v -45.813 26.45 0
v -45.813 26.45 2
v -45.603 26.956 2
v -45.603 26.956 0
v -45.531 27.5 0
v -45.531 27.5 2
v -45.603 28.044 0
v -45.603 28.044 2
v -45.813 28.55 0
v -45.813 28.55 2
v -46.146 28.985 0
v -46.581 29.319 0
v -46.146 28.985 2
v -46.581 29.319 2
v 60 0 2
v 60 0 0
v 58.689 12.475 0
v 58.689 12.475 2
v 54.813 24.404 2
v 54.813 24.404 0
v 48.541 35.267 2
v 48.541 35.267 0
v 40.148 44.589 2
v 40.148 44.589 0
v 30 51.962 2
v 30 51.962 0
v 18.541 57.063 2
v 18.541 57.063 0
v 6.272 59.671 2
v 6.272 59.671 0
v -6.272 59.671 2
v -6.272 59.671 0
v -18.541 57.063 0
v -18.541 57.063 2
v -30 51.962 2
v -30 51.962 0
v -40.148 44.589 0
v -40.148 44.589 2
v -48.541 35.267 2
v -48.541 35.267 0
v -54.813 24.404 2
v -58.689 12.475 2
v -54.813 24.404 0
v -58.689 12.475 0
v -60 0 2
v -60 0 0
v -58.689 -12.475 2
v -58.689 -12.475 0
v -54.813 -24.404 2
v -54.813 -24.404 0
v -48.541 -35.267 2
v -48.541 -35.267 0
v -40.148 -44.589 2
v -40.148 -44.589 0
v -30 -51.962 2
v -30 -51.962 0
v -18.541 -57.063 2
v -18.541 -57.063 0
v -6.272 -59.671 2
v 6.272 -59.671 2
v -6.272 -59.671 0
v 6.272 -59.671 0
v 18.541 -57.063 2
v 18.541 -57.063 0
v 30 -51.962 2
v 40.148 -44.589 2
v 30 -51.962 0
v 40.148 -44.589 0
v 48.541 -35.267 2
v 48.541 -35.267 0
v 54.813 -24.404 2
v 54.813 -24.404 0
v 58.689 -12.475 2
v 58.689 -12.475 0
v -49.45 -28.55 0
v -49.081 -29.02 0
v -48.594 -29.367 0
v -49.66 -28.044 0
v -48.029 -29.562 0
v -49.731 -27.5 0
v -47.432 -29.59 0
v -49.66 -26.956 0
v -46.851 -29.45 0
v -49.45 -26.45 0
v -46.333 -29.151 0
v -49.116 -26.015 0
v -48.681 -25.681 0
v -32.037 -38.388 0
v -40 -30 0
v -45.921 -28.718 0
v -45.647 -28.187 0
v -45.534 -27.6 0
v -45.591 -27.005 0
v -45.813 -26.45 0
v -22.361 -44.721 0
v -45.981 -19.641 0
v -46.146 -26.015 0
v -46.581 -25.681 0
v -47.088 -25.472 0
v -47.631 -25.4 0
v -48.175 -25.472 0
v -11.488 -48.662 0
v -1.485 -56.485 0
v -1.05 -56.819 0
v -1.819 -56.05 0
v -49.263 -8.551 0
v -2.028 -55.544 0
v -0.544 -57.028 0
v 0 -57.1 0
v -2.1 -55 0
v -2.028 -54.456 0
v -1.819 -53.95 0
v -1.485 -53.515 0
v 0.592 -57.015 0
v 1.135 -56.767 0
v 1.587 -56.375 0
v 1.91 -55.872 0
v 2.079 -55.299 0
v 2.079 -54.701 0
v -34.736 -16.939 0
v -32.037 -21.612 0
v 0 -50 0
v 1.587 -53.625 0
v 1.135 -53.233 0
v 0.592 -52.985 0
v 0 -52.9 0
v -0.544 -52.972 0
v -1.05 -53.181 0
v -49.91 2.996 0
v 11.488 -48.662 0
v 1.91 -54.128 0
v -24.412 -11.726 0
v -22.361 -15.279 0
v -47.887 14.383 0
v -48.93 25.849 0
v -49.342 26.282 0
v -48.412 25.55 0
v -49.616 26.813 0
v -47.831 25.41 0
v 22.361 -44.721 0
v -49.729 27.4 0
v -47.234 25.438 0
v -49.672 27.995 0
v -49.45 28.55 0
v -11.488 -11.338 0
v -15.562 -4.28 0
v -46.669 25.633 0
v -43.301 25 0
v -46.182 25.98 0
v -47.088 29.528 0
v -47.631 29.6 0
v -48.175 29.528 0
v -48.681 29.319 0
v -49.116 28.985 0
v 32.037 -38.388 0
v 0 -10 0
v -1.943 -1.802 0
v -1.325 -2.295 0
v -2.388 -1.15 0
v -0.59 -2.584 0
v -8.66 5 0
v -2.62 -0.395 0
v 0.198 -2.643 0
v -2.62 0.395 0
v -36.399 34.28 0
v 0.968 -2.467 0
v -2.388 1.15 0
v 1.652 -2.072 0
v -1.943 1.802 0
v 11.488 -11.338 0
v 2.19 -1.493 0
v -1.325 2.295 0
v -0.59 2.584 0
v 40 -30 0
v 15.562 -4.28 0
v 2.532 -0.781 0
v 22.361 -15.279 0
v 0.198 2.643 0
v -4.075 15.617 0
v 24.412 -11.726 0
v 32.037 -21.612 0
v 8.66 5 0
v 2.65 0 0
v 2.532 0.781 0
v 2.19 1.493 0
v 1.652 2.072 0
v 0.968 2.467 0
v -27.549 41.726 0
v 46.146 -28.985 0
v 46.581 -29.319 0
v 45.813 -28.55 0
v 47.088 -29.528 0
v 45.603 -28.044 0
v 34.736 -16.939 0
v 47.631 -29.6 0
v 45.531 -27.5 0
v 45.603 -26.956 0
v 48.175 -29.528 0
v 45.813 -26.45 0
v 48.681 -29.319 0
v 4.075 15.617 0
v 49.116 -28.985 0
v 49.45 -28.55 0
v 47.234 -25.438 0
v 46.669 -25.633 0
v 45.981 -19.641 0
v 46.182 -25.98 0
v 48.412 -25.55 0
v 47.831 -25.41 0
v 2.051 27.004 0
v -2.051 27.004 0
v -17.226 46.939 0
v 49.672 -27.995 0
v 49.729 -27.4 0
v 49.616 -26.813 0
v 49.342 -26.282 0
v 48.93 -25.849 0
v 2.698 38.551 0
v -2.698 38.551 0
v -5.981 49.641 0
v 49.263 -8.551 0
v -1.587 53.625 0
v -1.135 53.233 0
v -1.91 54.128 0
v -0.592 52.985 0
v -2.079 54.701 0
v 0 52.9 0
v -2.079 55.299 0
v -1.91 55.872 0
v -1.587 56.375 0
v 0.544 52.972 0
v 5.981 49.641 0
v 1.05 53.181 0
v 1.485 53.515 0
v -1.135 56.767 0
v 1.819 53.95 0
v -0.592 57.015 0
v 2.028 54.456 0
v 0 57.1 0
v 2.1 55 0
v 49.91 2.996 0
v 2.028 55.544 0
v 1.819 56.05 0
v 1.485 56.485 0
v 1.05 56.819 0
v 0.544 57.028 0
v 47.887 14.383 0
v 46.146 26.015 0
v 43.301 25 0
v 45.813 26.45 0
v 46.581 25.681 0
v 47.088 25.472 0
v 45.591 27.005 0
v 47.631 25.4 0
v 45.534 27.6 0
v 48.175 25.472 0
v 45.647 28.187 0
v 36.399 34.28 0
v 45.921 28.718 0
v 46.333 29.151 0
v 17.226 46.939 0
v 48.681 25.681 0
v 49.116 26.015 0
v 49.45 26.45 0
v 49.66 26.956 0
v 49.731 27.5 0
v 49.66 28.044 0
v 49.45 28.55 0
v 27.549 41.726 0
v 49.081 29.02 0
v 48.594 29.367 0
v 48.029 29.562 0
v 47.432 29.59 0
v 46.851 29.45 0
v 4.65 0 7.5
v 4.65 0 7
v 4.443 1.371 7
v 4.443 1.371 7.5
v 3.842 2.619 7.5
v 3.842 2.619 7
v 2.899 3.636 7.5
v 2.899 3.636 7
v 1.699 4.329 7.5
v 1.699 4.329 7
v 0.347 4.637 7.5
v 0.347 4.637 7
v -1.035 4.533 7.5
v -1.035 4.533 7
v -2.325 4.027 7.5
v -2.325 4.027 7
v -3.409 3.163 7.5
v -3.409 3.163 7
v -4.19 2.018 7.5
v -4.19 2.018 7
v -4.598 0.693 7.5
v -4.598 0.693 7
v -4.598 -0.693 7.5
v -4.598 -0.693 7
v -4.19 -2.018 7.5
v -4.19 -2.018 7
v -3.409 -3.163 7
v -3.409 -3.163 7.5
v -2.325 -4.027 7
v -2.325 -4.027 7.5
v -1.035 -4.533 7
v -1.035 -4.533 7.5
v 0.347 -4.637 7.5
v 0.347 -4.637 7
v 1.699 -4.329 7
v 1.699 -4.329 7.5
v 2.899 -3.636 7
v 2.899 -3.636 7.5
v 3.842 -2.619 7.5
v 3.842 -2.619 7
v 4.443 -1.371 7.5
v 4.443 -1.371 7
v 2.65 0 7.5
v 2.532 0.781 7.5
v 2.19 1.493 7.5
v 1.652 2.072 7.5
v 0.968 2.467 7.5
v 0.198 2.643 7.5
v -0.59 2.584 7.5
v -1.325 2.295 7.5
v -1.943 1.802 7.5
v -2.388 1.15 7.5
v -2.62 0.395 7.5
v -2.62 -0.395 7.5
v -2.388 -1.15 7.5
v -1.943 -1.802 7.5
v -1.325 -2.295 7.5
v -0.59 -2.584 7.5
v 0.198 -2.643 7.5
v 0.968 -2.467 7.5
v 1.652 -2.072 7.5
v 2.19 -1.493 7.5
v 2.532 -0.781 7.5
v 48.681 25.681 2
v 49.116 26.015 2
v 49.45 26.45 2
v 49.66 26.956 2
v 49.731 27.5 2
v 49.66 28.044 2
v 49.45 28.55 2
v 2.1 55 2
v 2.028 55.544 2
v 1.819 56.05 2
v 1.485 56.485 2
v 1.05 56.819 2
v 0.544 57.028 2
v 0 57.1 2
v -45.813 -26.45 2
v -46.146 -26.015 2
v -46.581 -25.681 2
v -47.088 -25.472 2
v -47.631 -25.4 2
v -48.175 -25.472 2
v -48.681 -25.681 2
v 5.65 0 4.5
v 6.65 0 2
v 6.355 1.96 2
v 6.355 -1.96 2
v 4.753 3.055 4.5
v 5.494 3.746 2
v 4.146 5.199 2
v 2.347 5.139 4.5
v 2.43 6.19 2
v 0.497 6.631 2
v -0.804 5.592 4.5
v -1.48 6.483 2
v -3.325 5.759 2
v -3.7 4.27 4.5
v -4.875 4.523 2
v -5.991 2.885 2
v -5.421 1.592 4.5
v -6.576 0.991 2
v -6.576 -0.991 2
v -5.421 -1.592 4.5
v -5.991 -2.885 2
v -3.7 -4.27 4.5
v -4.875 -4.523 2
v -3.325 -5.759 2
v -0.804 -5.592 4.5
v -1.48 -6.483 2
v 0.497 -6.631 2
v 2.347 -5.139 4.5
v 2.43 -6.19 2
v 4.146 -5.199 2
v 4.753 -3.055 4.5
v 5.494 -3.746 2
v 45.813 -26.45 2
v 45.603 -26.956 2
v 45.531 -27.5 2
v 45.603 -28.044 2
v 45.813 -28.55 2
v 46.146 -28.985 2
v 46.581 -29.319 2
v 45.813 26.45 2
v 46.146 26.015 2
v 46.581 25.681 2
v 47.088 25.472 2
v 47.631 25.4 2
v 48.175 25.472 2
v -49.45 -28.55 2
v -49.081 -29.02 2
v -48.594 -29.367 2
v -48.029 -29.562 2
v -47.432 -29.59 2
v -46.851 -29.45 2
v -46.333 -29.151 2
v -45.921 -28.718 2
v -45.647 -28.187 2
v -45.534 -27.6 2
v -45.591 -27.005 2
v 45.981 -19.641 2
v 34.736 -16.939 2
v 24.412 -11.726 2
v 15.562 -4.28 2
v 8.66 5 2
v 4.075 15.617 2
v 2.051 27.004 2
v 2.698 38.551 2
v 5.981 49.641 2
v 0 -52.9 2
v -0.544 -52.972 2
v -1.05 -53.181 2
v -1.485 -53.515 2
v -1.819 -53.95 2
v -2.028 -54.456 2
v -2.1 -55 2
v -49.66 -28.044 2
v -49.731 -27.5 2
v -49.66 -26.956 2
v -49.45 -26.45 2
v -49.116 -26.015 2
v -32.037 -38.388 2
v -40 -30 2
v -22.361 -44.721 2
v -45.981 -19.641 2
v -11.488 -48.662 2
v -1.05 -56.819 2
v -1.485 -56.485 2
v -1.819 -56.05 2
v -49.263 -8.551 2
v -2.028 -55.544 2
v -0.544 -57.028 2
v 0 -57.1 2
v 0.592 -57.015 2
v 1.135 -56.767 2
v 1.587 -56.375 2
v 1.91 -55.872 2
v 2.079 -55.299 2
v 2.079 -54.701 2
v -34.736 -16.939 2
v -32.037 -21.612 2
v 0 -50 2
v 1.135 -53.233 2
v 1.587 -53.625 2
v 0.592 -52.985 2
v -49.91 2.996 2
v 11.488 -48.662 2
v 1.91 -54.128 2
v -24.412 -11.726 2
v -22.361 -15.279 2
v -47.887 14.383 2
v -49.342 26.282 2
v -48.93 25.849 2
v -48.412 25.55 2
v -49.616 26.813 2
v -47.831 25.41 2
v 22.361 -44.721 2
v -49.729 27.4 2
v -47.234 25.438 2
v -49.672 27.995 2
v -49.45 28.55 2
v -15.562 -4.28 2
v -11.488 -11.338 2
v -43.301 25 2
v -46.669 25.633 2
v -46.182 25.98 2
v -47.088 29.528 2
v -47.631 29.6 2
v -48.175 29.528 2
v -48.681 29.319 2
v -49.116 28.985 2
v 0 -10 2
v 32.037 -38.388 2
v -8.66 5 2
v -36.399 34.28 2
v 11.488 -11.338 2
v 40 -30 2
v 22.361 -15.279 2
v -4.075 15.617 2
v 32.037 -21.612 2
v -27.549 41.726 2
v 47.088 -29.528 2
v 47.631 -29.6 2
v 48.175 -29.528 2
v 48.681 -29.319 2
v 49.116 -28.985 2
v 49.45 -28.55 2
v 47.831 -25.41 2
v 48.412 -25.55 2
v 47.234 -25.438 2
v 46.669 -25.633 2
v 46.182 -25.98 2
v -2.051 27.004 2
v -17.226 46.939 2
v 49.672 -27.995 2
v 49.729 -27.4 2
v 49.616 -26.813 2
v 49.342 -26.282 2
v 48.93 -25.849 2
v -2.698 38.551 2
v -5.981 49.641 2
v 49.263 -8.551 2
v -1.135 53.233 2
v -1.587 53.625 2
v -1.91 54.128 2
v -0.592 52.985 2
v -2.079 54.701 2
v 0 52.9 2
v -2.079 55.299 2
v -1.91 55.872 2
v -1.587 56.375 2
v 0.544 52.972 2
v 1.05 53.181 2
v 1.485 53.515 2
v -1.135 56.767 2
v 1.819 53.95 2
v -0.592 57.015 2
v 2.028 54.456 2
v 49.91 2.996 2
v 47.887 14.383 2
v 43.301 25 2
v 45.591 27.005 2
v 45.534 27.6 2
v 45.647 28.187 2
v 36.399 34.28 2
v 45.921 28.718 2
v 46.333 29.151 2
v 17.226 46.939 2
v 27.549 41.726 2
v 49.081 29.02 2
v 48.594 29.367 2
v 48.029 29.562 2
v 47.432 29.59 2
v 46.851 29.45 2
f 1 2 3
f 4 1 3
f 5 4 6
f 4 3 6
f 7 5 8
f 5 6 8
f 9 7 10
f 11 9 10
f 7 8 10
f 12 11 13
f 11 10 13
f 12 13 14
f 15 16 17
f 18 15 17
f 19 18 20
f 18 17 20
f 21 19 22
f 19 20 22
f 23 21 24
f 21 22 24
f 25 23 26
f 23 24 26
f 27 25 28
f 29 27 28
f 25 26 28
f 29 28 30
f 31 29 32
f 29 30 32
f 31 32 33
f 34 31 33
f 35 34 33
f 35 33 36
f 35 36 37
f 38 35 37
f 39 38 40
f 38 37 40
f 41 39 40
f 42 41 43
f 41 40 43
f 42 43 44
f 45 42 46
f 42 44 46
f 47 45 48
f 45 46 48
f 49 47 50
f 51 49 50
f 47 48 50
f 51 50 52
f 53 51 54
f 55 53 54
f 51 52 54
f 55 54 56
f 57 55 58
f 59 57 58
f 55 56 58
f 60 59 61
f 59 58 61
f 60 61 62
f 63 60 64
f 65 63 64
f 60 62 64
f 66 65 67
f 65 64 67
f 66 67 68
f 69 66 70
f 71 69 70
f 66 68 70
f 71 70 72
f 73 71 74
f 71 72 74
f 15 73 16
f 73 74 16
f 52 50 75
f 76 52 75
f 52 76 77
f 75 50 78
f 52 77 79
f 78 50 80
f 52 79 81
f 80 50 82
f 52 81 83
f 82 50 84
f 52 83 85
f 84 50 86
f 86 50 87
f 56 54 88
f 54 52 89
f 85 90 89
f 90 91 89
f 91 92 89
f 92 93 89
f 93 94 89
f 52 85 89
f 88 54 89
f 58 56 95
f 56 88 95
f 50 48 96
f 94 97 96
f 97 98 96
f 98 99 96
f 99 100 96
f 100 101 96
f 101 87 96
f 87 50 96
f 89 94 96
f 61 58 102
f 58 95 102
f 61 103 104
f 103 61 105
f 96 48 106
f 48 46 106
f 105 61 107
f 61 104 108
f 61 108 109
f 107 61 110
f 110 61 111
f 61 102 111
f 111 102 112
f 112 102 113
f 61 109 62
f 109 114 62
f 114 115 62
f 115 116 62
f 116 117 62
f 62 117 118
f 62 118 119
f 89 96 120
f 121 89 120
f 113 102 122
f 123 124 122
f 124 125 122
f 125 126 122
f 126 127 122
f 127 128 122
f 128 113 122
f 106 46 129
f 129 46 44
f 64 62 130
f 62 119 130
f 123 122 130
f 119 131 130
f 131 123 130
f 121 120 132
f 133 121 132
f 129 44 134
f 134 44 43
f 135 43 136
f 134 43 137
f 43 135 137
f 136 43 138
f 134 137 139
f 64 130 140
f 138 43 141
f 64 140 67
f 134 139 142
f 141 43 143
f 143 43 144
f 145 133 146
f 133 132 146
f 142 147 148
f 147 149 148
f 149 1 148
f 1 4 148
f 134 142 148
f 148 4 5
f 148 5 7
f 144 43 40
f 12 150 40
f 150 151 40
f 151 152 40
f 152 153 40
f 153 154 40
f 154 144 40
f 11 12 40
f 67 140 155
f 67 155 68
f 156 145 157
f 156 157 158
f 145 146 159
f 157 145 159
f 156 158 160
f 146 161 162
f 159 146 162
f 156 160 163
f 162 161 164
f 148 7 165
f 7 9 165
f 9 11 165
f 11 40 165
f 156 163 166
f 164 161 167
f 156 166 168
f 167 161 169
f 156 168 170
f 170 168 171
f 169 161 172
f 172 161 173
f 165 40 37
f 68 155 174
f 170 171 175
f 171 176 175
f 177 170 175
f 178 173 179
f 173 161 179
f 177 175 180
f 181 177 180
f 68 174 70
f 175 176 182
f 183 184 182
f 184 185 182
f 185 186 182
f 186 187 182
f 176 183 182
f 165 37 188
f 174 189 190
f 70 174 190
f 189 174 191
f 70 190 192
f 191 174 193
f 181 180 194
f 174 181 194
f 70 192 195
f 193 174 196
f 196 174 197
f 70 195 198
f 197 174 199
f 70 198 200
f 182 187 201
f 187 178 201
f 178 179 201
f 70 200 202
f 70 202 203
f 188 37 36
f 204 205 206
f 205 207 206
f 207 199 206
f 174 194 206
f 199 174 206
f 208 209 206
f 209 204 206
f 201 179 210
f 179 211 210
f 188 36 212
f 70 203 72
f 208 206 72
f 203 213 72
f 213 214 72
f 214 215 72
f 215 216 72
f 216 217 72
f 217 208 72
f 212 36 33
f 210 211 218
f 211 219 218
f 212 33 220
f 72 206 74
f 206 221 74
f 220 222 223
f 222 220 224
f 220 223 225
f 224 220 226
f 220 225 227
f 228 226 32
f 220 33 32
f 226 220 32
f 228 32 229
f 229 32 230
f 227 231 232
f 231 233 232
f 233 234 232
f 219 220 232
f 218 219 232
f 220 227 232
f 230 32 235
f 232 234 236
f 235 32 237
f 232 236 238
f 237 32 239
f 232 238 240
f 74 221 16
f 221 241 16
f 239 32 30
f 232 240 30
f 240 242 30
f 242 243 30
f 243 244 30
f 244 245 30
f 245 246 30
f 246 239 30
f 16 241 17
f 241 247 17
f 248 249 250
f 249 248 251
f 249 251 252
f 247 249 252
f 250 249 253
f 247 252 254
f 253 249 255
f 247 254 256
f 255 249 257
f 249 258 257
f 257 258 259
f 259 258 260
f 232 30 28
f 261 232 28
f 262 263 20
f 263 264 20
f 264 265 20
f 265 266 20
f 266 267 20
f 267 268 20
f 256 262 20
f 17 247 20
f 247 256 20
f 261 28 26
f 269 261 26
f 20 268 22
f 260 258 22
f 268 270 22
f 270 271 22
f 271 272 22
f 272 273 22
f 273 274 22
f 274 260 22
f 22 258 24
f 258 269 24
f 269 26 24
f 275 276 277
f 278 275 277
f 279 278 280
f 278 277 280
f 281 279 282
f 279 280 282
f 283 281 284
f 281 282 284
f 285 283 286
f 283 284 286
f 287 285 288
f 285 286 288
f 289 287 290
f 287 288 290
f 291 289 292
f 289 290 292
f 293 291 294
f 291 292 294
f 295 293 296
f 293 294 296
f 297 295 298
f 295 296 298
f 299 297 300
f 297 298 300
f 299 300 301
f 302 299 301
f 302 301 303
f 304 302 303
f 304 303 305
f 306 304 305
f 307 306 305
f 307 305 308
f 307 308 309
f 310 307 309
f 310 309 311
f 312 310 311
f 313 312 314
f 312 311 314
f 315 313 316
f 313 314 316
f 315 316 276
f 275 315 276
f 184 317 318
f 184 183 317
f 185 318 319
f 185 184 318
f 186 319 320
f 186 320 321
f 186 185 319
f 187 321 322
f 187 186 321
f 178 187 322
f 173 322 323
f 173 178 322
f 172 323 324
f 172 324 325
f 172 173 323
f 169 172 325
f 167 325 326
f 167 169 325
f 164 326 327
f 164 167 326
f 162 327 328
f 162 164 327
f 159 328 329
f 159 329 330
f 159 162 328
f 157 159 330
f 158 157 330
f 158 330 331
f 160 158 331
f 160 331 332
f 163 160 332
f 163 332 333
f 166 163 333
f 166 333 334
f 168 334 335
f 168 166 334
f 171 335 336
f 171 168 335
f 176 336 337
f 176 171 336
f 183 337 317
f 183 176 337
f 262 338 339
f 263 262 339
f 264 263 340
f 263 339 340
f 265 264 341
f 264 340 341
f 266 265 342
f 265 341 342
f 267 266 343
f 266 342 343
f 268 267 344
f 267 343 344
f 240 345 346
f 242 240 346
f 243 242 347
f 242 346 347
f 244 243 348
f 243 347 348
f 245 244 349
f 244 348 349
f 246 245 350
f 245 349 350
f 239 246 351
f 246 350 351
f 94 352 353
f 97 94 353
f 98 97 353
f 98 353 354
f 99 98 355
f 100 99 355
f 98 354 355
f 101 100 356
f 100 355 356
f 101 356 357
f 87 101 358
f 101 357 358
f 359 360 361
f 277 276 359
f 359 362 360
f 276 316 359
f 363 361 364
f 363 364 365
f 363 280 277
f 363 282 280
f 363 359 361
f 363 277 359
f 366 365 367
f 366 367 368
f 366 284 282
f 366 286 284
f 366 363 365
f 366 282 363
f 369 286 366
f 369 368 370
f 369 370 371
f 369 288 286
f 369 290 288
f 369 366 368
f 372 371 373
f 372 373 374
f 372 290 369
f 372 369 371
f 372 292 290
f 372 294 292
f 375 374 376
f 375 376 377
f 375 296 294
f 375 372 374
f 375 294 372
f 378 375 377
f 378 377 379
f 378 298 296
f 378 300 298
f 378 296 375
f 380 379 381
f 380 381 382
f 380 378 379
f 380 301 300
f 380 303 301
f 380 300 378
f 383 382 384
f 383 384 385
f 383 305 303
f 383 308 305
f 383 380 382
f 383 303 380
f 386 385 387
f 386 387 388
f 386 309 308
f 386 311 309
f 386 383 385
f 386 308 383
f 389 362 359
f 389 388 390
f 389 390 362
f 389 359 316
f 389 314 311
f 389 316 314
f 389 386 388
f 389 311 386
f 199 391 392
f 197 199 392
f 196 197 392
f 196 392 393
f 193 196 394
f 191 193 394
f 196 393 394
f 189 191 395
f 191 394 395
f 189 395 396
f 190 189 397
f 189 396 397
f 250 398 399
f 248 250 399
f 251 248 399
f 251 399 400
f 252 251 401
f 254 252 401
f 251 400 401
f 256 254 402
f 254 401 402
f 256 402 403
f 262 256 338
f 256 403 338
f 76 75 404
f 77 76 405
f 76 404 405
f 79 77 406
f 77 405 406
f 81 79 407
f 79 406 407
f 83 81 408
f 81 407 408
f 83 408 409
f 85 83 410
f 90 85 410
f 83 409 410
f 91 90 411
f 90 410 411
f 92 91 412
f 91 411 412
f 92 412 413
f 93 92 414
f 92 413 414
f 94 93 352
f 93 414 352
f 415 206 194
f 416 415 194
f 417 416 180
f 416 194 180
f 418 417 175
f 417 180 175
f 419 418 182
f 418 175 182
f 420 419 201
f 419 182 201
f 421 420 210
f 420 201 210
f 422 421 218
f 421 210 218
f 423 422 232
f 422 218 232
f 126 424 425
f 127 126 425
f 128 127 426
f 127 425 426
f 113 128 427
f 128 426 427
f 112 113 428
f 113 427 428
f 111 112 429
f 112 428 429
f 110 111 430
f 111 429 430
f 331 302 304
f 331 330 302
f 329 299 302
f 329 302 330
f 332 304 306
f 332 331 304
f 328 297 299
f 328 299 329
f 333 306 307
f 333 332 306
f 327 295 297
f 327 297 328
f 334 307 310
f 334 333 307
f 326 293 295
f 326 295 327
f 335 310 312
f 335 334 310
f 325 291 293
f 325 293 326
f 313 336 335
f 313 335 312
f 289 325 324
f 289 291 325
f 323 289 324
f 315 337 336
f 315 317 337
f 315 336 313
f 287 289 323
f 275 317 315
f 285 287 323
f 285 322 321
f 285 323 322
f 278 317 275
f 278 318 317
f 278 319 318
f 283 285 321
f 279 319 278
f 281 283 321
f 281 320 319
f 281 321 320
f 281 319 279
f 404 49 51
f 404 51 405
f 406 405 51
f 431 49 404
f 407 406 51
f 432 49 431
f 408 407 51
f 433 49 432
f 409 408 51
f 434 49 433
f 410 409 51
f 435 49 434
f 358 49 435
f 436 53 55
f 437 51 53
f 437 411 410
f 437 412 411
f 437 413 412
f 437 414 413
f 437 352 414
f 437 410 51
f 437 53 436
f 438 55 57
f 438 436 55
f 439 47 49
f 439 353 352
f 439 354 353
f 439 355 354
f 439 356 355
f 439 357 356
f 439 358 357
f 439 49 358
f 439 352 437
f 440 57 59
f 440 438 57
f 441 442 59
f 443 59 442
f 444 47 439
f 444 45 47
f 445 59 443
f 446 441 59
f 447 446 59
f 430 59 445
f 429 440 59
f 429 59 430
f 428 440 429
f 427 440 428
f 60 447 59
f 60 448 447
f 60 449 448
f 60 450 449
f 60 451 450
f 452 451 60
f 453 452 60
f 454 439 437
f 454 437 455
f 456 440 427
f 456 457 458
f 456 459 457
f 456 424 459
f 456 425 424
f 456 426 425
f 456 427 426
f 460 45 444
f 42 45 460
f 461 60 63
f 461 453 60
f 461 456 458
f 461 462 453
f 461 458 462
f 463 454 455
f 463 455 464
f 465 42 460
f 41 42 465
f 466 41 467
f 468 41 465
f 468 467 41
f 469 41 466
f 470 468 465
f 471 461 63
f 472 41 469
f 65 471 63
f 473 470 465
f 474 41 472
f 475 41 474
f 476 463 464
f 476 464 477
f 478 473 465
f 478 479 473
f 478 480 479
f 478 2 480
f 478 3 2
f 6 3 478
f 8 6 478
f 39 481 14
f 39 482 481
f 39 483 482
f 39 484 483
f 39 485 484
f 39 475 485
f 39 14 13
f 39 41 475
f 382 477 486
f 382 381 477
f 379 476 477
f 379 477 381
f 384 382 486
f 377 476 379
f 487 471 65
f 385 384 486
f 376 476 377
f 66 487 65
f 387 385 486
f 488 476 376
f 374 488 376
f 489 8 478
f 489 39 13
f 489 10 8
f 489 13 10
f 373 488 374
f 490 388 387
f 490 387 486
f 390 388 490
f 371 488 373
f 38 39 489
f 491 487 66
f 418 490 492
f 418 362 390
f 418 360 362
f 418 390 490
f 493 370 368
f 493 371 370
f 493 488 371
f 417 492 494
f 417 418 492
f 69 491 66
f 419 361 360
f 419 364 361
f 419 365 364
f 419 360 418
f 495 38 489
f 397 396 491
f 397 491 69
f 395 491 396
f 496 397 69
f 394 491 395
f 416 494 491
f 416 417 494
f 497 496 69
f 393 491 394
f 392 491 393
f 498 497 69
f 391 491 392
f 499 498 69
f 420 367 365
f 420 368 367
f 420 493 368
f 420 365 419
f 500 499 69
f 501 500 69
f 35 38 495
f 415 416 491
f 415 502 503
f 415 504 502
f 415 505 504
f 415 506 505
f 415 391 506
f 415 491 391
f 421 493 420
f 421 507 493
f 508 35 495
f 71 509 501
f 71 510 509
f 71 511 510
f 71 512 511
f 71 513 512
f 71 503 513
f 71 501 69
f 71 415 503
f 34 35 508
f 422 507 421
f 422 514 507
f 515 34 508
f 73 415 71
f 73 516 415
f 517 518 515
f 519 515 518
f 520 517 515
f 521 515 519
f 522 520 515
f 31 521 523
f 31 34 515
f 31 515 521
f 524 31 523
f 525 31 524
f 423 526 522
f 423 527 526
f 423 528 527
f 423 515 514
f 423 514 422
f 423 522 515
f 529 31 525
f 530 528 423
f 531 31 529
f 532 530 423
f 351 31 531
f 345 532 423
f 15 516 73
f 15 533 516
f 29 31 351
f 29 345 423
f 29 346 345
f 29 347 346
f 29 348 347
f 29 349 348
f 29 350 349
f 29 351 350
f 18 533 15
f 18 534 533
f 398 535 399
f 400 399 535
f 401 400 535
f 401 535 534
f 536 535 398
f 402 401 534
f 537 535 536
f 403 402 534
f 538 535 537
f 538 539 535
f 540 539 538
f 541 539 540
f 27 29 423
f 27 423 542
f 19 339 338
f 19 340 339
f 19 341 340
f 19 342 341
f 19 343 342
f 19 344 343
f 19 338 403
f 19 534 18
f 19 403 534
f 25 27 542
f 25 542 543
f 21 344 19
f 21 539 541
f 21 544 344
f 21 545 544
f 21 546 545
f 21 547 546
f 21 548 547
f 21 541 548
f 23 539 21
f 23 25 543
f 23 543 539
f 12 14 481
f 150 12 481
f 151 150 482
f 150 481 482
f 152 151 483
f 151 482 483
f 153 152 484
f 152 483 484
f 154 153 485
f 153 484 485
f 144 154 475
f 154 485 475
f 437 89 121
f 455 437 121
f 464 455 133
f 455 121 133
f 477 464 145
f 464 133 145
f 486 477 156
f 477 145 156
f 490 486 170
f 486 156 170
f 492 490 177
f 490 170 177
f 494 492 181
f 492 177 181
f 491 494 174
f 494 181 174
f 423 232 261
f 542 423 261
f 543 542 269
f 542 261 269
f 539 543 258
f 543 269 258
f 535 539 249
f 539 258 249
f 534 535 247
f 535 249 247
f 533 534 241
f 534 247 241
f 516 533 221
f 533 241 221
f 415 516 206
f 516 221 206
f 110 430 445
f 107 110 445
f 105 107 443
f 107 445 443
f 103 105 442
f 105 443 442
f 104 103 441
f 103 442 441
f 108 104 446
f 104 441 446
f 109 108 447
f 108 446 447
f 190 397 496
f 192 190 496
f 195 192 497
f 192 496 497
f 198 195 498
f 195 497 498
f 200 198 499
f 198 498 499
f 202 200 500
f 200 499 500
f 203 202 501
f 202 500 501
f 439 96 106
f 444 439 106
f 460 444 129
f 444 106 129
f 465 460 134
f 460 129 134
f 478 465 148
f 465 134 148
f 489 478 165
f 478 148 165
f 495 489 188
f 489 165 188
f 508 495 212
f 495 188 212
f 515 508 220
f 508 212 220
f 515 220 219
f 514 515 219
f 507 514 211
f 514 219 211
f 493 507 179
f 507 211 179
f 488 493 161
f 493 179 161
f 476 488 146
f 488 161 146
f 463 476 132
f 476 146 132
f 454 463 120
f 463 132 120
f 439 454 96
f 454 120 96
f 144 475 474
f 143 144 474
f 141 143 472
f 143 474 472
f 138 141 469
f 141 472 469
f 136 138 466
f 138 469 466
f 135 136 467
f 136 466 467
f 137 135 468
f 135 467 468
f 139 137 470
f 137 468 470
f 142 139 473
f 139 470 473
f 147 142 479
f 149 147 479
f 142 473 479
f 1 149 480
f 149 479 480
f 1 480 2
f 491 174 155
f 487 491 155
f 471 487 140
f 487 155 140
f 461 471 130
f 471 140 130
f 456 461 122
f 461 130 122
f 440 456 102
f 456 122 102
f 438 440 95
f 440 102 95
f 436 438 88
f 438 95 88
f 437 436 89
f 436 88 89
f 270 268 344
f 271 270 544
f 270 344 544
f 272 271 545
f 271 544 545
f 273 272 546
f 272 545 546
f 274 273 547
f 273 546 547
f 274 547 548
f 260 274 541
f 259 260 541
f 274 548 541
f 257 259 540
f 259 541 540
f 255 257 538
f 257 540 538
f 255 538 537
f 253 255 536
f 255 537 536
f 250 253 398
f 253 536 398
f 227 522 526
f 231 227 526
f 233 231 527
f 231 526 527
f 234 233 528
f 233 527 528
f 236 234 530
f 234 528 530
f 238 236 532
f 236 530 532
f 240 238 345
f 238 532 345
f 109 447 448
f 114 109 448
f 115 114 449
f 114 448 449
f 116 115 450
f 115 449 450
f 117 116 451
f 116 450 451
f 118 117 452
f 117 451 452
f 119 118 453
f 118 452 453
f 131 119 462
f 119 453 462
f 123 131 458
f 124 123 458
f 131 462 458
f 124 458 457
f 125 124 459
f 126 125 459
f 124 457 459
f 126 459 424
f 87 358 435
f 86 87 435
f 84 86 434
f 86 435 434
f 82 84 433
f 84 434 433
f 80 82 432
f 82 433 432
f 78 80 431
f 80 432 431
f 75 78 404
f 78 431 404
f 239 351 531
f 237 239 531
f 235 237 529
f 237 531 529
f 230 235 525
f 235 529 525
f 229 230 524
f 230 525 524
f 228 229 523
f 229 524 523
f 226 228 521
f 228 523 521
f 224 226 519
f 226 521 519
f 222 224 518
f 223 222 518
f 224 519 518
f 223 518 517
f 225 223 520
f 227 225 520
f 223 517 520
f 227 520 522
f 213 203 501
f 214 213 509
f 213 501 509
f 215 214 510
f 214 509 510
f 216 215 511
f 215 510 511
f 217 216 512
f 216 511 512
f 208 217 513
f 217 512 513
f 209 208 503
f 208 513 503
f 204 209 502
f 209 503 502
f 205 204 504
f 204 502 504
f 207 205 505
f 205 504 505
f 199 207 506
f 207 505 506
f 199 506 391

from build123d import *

# Parameters (mm, degrees)
SKETCH1_R           = 60
SKETCH1_R_2         = 2.65
BOSS_EXTRUDE2_DEPTH = 2
CUT_EXTRUDE1_DEPTH  = 85.876380696
CIRPATTERN1_COUNT   = 6
SKETCH3_R           = 4.65
SKETCH3_R_2         = 2.65
BOSS_EXTRUDE3_DEPTH = 5.5
CHAMFER1_SIZE       = 2
CHAMFER1_SIZE2      = 5


with BuildPart() as part:
    # Sketch1 → Boss-Extrude2 (new body)
    with BuildSketch(Plane.XY):
        Circle(SKETCH1_R)
        with BuildLine():
            ThreePointArc((40, -30), (0, -50), (-40, -30))
            ThreePointArc((-40, -30), (0, -10), (40, -30))
        make_face(mode=Mode.SUBTRACT)
        with BuildLine():
            ThreePointArc((-5.980762114, 49.641016151), (-8.660254038, 5), (-45.980762114, -19.641016151))
            ThreePointArc((-45.980762114, -19.641016151), (-43.301270189, 25), (-5.980762114, 49.641016151))
        make_face(mode=Mode.SUBTRACT)
        Circle(SKETCH1_R_2, mode=Mode.SUBTRACT)
        with BuildLine():
            ThreePointArc((5.980762114, 49.641016151), (43.301270189, 25), (45.980762114, -19.641016151))
            ThreePointArc((45.980762114, -19.641016151), (8.660254038, 5), (5.980762114, 49.641016151))
        make_face(mode=Mode.SUBTRACT)
    extrude(amount=BOSS_EXTRUDE2_DEPTH)

    # Sketch2 → Cut-Extrude1 (cut, through all)
    with BuildSketch(Plane.XY.offset(2)):
        with BuildLine():
            ThreePointArc((0, 57.1), (-2.1, 55), (0, 52.9))
            Line((0, 52.9), (0, 57.1))
        make_face()
        with BuildLine():
            Line((0, 57.1), (0, 52.9))
            ThreePointArc((0, 52.9), (1.48492424, 53.51507576), (2.1, 55))
            ThreePointArc((2.1, 55), (1.48492424, 56.48492424), (0, 57.1))
        make_face()
    cut_extrude1 = extrude(amount=-CUT_EXTRUDE1_DEPTH, mode=Mode.SUBTRACT)

    # CirPattern1: Cut-Extrude1 ×6 about axis
    cirpattern1_axis = Axis((0, 0, 0), (0, 0, 1))
    for i in range(1, CIRPATTERN1_COUNT):
        add(cut_extrude1.rotate(cirpattern1_axis, i * 360 / CIRPATTERN1_COUNT), mode=Mode.SUBTRACT)

    # Sketch3 → Boss-Extrude3 (add)
    with BuildSketch(Plane.XY.offset(2)):
        Circle(SKETCH3_R)
        Circle(SKETCH3_R_2, mode=Mode.SUBTRACT)
    extrude(amount=BOSS_EXTRUDE3_DEPTH)

    # Chamfer1
    chamfer1_edges = [part.edges().sort_by_distance(p)[0] for p in [
        (-4.65, 0, 2),
    ]]
    chamfer1_side = [part.faces().sort_by_distance(p)[0] for p in [
        (-58.302943725, 0, 2),
    ]]
    chamfer(chamfer1_edges, length=CHAMFER1_SIZE, length2=CHAMFER1_SIZE2, reference=chamfer1_side[0])


solid = part.part
